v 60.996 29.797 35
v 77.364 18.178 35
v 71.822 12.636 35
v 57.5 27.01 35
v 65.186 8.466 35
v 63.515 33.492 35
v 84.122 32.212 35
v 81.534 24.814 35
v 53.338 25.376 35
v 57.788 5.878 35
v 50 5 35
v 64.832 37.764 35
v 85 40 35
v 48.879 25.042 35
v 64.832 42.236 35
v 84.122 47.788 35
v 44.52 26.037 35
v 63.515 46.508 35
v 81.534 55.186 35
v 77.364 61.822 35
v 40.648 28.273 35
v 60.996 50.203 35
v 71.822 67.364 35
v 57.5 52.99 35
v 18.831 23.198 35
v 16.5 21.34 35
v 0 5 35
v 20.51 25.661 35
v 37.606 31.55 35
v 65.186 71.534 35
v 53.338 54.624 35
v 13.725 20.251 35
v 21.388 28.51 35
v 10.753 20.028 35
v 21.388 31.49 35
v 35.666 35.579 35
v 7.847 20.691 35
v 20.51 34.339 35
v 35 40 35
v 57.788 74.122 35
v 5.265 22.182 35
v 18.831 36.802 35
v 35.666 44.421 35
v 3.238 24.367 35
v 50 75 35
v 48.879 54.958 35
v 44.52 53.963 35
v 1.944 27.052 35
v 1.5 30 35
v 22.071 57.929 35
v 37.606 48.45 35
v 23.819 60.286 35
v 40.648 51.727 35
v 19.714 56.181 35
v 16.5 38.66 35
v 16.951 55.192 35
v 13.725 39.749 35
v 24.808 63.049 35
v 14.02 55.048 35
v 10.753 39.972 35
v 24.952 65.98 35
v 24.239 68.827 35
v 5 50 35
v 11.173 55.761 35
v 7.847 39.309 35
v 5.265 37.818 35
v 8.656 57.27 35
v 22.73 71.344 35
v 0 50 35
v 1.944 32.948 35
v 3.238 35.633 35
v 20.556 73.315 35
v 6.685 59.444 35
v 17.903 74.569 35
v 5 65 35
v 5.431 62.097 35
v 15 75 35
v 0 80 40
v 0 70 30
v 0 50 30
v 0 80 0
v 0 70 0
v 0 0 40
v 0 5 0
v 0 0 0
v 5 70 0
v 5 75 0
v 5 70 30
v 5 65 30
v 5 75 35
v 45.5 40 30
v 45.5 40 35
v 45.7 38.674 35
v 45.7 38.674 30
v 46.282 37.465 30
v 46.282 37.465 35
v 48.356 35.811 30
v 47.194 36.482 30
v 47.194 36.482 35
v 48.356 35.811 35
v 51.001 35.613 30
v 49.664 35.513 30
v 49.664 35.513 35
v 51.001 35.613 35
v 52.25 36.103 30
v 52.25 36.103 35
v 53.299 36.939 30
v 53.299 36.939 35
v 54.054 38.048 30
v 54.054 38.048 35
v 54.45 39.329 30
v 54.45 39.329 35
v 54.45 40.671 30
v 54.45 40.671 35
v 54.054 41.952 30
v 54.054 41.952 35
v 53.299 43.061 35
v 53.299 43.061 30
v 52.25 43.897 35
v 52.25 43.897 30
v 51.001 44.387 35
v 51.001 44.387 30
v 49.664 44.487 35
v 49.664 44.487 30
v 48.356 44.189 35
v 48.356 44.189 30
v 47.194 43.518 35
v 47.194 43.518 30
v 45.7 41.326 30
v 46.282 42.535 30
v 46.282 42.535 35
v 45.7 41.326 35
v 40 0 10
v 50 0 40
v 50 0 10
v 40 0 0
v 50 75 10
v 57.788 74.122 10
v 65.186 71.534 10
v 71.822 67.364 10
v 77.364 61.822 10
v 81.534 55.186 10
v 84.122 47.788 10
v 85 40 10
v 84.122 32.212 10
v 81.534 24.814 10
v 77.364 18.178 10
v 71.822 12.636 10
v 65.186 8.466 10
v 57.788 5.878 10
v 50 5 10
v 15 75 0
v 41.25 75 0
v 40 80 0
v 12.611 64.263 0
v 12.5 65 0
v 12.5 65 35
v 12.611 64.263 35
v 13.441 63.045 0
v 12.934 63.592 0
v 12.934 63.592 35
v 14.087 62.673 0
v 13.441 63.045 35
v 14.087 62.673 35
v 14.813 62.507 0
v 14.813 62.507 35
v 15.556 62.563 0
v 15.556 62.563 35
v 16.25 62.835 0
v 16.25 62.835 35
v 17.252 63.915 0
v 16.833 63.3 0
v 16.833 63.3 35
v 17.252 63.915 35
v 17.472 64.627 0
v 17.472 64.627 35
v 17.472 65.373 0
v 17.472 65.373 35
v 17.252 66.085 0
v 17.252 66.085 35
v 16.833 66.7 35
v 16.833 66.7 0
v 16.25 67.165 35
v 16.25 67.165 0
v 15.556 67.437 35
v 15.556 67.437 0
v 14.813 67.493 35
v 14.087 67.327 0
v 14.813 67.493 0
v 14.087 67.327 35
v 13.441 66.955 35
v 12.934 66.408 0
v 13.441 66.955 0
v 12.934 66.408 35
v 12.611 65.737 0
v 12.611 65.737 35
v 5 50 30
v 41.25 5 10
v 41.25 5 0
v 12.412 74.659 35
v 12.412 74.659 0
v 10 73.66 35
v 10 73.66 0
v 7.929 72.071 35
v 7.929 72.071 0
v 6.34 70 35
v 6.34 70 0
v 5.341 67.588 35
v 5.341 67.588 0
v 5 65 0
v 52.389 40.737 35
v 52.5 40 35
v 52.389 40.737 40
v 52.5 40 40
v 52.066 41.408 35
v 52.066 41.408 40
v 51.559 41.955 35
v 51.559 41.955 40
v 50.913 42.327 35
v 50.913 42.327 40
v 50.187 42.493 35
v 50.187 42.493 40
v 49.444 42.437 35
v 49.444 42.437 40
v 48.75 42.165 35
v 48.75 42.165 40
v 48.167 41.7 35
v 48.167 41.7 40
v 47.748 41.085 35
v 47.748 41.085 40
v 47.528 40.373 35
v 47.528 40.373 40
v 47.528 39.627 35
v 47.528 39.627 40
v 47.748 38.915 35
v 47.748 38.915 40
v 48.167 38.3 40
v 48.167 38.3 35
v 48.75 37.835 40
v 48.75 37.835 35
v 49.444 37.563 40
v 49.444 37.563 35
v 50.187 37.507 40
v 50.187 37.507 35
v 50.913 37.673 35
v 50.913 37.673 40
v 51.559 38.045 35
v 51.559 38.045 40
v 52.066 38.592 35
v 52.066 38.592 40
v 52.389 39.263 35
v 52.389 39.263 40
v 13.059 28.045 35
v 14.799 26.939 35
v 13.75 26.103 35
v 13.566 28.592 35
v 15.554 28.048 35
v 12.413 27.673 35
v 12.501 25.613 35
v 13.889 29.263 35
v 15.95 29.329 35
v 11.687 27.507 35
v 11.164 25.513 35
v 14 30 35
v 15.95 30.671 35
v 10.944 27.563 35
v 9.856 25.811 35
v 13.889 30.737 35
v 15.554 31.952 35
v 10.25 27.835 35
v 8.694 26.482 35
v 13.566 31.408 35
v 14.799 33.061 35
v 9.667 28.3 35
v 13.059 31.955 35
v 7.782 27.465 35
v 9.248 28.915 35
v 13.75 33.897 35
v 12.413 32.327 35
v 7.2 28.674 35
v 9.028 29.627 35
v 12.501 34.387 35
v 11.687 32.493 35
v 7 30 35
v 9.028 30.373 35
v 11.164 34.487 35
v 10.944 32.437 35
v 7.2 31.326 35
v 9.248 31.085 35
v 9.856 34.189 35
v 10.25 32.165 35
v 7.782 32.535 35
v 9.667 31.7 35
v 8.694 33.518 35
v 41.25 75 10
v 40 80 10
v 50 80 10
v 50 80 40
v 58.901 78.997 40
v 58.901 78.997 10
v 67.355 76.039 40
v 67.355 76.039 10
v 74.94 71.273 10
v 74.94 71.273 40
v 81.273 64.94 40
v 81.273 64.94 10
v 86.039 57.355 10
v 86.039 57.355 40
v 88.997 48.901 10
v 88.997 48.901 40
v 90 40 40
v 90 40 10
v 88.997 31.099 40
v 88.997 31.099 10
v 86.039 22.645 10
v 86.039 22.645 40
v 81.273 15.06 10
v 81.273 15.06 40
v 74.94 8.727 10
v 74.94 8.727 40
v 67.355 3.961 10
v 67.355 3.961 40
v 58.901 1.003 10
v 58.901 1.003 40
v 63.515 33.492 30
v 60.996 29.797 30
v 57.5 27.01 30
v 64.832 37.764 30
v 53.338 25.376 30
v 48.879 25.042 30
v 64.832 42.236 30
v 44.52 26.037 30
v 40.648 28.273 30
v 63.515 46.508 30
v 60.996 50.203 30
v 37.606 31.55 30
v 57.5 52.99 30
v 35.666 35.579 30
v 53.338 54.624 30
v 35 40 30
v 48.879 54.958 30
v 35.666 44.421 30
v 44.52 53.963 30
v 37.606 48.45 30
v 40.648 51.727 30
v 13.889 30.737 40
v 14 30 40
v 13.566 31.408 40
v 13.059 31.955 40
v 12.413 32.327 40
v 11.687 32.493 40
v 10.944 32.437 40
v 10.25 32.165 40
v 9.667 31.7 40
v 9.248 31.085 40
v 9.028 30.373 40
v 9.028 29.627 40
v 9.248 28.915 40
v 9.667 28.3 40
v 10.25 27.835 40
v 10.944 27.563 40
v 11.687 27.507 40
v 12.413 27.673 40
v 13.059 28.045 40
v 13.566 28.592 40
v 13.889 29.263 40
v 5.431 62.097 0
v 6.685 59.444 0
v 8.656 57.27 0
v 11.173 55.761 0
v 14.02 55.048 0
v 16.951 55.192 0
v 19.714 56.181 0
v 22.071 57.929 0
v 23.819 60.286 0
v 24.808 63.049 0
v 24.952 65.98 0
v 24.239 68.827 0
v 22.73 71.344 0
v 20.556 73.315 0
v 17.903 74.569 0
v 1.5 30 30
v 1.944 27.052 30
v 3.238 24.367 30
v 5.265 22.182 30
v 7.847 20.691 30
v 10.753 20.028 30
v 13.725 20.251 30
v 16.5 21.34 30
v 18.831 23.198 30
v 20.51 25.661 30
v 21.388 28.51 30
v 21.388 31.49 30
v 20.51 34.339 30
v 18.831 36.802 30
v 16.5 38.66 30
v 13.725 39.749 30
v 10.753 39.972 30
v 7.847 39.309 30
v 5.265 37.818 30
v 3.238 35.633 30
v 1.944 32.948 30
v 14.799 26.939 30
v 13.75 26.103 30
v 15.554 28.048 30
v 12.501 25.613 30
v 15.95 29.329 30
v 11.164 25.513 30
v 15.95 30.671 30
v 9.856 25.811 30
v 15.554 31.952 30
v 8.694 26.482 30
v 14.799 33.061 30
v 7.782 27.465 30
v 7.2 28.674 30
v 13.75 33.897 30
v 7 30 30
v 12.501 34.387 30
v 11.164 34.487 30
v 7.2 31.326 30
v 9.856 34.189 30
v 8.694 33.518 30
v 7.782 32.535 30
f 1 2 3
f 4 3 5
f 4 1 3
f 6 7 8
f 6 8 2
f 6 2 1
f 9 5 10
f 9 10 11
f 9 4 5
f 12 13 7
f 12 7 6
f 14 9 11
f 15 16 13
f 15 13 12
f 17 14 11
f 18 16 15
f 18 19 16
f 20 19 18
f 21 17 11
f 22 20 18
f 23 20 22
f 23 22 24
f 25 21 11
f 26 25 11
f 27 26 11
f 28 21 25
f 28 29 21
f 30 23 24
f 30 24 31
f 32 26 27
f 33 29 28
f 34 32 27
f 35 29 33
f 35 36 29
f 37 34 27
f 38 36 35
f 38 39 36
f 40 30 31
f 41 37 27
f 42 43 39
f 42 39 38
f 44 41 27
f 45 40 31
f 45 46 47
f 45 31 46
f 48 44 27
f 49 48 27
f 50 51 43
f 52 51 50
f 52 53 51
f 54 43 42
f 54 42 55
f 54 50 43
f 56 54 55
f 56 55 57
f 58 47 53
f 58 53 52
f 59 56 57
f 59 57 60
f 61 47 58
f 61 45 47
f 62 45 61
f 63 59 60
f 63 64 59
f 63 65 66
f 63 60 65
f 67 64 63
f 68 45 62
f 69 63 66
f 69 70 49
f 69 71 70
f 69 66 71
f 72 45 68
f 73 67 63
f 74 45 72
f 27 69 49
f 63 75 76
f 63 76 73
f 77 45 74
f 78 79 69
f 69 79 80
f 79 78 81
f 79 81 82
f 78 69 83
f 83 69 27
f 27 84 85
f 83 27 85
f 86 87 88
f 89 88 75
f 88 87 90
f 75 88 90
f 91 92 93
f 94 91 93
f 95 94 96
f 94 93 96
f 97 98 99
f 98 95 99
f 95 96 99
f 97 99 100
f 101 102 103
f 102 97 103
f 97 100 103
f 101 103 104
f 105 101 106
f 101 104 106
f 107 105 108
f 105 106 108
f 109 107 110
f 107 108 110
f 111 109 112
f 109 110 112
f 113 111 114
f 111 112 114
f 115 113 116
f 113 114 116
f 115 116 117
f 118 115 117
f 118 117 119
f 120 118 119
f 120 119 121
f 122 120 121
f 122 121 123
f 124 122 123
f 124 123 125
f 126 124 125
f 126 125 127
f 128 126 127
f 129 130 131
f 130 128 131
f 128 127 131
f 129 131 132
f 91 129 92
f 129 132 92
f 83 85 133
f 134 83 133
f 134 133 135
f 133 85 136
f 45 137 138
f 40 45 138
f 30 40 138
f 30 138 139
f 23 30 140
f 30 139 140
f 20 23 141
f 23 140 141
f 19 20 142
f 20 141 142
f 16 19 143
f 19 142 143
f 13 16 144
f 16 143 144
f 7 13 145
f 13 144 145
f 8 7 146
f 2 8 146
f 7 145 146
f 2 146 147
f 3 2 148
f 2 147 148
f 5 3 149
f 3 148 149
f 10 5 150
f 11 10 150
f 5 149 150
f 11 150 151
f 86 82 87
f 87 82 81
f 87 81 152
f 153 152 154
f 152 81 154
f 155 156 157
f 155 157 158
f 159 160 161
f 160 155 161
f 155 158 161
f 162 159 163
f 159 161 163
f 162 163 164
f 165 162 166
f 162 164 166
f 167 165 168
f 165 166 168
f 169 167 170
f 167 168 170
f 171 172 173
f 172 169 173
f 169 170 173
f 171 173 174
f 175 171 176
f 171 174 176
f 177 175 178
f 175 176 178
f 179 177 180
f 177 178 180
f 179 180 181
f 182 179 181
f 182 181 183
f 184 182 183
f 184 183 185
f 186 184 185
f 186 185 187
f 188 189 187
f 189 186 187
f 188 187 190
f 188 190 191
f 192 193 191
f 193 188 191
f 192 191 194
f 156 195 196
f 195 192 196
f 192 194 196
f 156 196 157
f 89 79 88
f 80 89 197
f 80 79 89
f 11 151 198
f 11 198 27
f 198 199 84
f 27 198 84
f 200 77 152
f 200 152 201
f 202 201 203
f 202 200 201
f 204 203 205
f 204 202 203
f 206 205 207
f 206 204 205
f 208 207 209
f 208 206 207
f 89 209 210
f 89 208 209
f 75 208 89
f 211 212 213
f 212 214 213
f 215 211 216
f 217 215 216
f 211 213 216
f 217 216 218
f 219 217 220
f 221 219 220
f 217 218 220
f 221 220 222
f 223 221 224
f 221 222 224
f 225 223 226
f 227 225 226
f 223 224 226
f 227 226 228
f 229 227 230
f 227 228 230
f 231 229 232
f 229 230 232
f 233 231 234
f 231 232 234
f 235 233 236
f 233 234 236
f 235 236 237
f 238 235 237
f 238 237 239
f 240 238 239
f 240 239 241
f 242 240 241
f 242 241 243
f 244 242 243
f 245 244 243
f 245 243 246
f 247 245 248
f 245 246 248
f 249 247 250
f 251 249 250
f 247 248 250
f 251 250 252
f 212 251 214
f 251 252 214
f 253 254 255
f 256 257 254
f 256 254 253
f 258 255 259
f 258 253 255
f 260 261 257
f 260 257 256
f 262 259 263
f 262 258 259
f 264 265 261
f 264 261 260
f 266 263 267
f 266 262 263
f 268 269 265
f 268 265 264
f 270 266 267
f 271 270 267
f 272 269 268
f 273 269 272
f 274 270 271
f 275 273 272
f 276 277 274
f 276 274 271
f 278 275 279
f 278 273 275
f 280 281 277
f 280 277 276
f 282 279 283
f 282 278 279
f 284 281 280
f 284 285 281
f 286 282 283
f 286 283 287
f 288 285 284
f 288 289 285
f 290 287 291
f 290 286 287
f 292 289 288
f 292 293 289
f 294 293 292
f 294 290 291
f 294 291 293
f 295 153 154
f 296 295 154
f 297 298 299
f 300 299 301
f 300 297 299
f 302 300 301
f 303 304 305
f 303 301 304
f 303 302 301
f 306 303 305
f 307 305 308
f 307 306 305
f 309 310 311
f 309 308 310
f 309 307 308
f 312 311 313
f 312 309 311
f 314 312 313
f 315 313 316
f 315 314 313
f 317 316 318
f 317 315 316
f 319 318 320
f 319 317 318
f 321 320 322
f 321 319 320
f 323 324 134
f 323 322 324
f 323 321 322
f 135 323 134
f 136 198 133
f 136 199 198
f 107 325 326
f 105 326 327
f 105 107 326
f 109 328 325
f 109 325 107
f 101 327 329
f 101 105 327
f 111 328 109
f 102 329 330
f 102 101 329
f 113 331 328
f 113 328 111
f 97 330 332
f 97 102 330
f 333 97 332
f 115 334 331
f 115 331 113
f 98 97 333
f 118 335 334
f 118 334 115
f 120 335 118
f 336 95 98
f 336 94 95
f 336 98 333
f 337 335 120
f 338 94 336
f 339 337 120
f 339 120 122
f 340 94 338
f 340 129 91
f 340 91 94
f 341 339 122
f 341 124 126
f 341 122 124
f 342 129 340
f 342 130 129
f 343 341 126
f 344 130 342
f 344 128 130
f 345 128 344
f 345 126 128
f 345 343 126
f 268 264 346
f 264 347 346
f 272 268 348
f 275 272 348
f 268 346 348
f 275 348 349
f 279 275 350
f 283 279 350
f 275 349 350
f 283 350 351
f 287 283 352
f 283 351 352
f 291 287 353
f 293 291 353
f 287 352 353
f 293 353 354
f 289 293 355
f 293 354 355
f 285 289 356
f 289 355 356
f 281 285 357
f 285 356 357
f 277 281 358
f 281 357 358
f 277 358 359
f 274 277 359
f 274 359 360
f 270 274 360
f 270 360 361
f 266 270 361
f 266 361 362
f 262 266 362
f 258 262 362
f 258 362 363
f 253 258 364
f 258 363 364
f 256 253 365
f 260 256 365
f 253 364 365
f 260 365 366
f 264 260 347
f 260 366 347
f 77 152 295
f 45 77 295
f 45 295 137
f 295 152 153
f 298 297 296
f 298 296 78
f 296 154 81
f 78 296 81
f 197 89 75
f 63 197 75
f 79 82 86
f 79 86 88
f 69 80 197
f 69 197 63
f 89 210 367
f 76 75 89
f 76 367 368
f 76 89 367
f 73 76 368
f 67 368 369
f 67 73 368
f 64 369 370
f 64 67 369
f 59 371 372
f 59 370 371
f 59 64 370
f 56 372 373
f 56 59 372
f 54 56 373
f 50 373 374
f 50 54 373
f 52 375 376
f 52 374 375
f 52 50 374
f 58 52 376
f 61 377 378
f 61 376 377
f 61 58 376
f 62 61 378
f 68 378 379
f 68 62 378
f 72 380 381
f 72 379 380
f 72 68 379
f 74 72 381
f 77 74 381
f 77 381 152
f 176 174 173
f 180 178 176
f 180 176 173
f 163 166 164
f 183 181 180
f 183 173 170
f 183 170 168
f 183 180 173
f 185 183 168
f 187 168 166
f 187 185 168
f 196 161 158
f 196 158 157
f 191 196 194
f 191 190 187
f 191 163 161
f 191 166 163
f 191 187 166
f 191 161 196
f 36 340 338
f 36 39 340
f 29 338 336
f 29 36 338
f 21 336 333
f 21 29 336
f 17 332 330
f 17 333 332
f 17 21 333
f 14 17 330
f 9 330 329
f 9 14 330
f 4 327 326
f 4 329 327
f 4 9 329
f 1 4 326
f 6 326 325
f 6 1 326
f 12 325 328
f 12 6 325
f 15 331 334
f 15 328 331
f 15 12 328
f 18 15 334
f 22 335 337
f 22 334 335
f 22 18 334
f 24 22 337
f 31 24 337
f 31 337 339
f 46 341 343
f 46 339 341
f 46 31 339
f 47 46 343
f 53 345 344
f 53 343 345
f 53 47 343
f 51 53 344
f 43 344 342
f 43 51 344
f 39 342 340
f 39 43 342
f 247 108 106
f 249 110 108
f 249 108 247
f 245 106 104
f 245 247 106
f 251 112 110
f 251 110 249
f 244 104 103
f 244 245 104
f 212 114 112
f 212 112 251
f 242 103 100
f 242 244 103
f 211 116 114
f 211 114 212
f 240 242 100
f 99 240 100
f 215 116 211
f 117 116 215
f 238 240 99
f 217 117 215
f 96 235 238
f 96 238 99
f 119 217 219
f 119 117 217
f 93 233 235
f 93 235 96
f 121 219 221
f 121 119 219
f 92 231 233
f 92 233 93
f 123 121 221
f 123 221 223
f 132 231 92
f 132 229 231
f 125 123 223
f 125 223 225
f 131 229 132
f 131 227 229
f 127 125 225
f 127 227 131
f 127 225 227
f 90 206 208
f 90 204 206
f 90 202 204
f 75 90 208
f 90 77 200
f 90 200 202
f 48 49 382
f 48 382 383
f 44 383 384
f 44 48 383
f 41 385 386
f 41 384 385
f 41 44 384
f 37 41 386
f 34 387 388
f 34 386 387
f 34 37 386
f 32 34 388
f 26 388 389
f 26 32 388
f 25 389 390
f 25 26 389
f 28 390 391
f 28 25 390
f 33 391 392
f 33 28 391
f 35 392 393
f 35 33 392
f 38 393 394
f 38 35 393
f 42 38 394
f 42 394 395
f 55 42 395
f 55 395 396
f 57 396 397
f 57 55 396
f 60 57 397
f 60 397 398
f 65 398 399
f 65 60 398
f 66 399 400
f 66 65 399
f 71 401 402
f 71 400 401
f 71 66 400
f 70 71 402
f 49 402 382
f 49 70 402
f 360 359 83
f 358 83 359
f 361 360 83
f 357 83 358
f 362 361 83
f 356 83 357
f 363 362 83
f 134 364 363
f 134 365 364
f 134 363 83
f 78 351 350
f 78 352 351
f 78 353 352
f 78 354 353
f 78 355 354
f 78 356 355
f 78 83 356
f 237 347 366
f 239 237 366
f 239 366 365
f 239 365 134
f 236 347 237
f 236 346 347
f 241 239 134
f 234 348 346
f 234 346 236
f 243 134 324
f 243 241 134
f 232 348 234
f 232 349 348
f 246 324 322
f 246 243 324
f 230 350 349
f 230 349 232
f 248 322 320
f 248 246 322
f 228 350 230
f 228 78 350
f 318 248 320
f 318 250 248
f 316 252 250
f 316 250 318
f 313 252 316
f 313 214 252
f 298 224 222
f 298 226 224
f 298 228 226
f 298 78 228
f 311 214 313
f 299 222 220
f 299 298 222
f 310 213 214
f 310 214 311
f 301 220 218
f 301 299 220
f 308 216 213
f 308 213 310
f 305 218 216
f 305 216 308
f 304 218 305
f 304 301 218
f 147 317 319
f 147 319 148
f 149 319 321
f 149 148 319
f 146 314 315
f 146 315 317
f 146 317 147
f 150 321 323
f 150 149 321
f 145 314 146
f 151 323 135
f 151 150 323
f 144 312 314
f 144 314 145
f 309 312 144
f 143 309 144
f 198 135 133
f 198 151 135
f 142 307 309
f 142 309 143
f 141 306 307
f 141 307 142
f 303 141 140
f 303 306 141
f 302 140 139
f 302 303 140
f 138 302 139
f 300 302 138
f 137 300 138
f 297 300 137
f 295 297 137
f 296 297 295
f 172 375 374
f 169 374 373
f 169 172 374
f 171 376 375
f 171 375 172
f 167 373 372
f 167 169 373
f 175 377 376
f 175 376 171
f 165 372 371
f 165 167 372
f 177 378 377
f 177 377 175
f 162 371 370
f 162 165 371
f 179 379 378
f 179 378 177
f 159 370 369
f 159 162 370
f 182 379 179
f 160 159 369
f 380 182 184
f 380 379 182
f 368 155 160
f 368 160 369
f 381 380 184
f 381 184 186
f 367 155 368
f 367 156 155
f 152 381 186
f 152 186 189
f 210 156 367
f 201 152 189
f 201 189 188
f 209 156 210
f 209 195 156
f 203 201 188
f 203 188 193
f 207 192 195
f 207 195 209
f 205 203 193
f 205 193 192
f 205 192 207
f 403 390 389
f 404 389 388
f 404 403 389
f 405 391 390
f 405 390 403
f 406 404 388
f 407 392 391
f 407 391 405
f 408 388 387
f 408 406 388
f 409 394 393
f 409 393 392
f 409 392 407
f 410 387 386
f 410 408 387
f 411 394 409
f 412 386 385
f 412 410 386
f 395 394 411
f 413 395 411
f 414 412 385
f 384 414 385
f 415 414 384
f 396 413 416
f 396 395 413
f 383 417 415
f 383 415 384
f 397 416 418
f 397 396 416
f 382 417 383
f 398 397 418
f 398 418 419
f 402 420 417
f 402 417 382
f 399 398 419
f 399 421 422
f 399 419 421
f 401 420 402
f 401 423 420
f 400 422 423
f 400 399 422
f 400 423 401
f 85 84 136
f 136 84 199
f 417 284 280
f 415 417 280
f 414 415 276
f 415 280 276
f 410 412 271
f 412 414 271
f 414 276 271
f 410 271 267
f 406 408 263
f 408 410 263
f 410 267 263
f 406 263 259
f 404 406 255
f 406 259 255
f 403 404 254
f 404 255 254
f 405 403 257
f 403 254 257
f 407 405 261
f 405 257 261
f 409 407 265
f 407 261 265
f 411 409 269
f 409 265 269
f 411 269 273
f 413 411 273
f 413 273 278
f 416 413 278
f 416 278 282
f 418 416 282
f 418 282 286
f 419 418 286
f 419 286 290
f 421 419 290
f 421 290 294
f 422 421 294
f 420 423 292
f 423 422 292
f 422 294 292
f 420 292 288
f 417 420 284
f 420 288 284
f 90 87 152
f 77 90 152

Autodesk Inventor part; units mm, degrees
ref_plane "YZ Plane" through (0, 0, 0) normal (1, 0, 0) x (0, 1, 0)
ref_plane "XZ Plane" through (0, 0, 0) normal (0, 1, 0) x (-1, 0, 0)
ref_plane "XY Plane" through (0, 0, 0) normal (0, 0, 1) x (1, 0, 0)
sketch "Sketch1" plane through (0, 0, 0) normal (0, 0, 1) x (1, 0, 0)
  line L0 (0, 0) -> (50, 0)
  line L1 (50, 0) -> (50, 80) construction
  line L2 (50, 80) -> (0, 80)
  line L3 (0, 80) -> (0, 0)
  circle A0 centre (50, 40) radius 40 construction
  arc A1 (50, 0) -> (50, 80) centre (50, 40) ccw
  dimension "d0" = 50
  dimension "d1" = 80
  dimension "d2" = 80
extrude "Extrusion1" add sketch "Sketch1" along normal blind 40
sketch "Sketch2" plane through (0, 0, 0) normal (0, 0, -1) x (-1, 0, 0)
  line L0 (-50, 80) -> (0, 80) projected
  arc A0 (-50, 80) -> (-50, 0) centre (-50, 40) ccw projected
  line L1 (0, 0) -> (-50, 0) projected
  line L2 (0, 75) -> (-50, 75)
  arc A1 (-50, 75) -> (-50, 5) centre (-50, 40) ccw
  line L3 (-50, 5) -> (0, 5)
  line L4 (0, 75) -> (0, 5)
  line L5 (0, 80) -> (0, 0) projected
  dimension "d5" = 5
extrude "Extrusion2" cut sketch "Sketch2" against normal blind 35 contours L4 L3 A1 L2
sketch "Sketch3" plane through (0, 0, 40) normal (-1, 0, 0) x (0, 0, 1)
  line L0 (0, 80) -> (0, 0) projected
  line L1 (-40, 5) -> (-40, 75) projected
  line L2 (0, 80) -> (-40, 80)
  line L3 (-40, 80) -> (-40, 70)
  line L4 (-40, 70) -> (0, 70)
  line L5 (0, 70) -> (0, 80)
  line L6 (0, 80) -> (-10, 80)
  line L7 (-10, 80) -> (-10, 50)
  line L8 (-10, 50) -> (0, 50)
  line L9 (0, 50) -> (0, 80)
  line L10 (-40, 0) -> (0, 0) projected
  dimension "d8" = 10
  dimension "d9" = 10
  dimension "d10" = 50
extrude "Extrusion3" add sketch "Sketch3" against normal blind 5
sketch "Sketch4" plane through (0, 0, 0) normal (0, 0, -1) x (-1, 0, 0)
  arc A0 (-50, 80) -> (-50, 0) centre (-50, 40) ccw projected
  line L0 (-50, 80) -> (0, 80) projected
  arc A1 (-50, 80) -> (-50, 0) centre (-50, 40) ccw
  line L1 (-50, 0) -> (-50, 80)
  line L2 (-50, 40) -> (-40, 80)
  line L3 (-50, 80) -> (0, 80) projected
  line L4 (-40, 80) -> (-50, 80)
  line L5 (-50, 40) -> (-40, 0)
  line L6 (0, 0) -> (-50, 0) projected
  line L7 (-40, 0) -> (-50, 0)
  dimension "d15" = 10
extrude "Extrusion4" cut sketch "Sketch4" against normal blind 10
sketch "Sketch8" plane through (0, 0, 35) normal (0, 0, -1) x (-1, 0, 0)
  circle A0 centre (-50, 40) radius 4.5
  circle A1 centre (-50, 40) radius 15
  line L0 (0, 0) -> (-40, 0) projected
  line L1 (0, 50) -> (0, 5) projected
  dimension "d25" = 30
  dimension "d34" = 40
  dimension "d35" = 50
  dimension "d36" = 9
extrude "Extrusion8" add sketch "Sketch8" along normal blind 5
sketch "Sketch9" plane through (0, 0, 35) normal (0, 0, -1) x (-1, 0, 0)
  line L0 (0, 80) -> (0, 0) projected
  circle A0 centre (-11.5, 30) radius 4.5
  line L1 (0, 0) -> (-40, 0) projected
  circle A1 centre (-11.5, 30) radius 10
  dimension "d28" = 9
  dimension "d29" = 30
  dimension "d30" = 11.5
  dimension "d33" = 20
extrude "Extrusion9" add sketch "Sketch9" along normal blind 5
sketch "Sketch11" plane through (0, 0, 35) normal (0, 0, -1) x (-1, 0, 0)
  circle A0 centre (-15, 65) radius 10
  circle A1 centre (-15, 65) radius 2.5
  line L0 (-41.25, 75) -> (-5, 75) projected
  line L1 (-5, 50) -> (-5, 70) projected
  point P0 (0, 0)
  dimension "d39" = 20
  dimension "d40" = 5
extrude "Extrusion10" add sketch "Sketch11" along normal blind 35
sketch "Sketch13" plane through (0, 0, 40) normal (0, 0, 1) x (1, 0, 0)
  circle A0 centre (50, 40) radius 15 projected
  circle A1 centre (11.5, 30) radius 10 projected
  circle A2 centre (11.5, 30) radius 4.5 projected
  circle A3 centre (11.5, 30) radius 2.5
  circle A4 centre (50, 40) radius 4.5 projected
  circle A5 centre (50, 40) radius 2.5
  point P0 (0, 0)
  dimension "d46" = 5
  dimension "d47" = 5
extrude "Extrusion12" cut sketch "Sketch13" against normal through all contours A3 | A5
properties part number "FA005" material "ABS Plastic"
